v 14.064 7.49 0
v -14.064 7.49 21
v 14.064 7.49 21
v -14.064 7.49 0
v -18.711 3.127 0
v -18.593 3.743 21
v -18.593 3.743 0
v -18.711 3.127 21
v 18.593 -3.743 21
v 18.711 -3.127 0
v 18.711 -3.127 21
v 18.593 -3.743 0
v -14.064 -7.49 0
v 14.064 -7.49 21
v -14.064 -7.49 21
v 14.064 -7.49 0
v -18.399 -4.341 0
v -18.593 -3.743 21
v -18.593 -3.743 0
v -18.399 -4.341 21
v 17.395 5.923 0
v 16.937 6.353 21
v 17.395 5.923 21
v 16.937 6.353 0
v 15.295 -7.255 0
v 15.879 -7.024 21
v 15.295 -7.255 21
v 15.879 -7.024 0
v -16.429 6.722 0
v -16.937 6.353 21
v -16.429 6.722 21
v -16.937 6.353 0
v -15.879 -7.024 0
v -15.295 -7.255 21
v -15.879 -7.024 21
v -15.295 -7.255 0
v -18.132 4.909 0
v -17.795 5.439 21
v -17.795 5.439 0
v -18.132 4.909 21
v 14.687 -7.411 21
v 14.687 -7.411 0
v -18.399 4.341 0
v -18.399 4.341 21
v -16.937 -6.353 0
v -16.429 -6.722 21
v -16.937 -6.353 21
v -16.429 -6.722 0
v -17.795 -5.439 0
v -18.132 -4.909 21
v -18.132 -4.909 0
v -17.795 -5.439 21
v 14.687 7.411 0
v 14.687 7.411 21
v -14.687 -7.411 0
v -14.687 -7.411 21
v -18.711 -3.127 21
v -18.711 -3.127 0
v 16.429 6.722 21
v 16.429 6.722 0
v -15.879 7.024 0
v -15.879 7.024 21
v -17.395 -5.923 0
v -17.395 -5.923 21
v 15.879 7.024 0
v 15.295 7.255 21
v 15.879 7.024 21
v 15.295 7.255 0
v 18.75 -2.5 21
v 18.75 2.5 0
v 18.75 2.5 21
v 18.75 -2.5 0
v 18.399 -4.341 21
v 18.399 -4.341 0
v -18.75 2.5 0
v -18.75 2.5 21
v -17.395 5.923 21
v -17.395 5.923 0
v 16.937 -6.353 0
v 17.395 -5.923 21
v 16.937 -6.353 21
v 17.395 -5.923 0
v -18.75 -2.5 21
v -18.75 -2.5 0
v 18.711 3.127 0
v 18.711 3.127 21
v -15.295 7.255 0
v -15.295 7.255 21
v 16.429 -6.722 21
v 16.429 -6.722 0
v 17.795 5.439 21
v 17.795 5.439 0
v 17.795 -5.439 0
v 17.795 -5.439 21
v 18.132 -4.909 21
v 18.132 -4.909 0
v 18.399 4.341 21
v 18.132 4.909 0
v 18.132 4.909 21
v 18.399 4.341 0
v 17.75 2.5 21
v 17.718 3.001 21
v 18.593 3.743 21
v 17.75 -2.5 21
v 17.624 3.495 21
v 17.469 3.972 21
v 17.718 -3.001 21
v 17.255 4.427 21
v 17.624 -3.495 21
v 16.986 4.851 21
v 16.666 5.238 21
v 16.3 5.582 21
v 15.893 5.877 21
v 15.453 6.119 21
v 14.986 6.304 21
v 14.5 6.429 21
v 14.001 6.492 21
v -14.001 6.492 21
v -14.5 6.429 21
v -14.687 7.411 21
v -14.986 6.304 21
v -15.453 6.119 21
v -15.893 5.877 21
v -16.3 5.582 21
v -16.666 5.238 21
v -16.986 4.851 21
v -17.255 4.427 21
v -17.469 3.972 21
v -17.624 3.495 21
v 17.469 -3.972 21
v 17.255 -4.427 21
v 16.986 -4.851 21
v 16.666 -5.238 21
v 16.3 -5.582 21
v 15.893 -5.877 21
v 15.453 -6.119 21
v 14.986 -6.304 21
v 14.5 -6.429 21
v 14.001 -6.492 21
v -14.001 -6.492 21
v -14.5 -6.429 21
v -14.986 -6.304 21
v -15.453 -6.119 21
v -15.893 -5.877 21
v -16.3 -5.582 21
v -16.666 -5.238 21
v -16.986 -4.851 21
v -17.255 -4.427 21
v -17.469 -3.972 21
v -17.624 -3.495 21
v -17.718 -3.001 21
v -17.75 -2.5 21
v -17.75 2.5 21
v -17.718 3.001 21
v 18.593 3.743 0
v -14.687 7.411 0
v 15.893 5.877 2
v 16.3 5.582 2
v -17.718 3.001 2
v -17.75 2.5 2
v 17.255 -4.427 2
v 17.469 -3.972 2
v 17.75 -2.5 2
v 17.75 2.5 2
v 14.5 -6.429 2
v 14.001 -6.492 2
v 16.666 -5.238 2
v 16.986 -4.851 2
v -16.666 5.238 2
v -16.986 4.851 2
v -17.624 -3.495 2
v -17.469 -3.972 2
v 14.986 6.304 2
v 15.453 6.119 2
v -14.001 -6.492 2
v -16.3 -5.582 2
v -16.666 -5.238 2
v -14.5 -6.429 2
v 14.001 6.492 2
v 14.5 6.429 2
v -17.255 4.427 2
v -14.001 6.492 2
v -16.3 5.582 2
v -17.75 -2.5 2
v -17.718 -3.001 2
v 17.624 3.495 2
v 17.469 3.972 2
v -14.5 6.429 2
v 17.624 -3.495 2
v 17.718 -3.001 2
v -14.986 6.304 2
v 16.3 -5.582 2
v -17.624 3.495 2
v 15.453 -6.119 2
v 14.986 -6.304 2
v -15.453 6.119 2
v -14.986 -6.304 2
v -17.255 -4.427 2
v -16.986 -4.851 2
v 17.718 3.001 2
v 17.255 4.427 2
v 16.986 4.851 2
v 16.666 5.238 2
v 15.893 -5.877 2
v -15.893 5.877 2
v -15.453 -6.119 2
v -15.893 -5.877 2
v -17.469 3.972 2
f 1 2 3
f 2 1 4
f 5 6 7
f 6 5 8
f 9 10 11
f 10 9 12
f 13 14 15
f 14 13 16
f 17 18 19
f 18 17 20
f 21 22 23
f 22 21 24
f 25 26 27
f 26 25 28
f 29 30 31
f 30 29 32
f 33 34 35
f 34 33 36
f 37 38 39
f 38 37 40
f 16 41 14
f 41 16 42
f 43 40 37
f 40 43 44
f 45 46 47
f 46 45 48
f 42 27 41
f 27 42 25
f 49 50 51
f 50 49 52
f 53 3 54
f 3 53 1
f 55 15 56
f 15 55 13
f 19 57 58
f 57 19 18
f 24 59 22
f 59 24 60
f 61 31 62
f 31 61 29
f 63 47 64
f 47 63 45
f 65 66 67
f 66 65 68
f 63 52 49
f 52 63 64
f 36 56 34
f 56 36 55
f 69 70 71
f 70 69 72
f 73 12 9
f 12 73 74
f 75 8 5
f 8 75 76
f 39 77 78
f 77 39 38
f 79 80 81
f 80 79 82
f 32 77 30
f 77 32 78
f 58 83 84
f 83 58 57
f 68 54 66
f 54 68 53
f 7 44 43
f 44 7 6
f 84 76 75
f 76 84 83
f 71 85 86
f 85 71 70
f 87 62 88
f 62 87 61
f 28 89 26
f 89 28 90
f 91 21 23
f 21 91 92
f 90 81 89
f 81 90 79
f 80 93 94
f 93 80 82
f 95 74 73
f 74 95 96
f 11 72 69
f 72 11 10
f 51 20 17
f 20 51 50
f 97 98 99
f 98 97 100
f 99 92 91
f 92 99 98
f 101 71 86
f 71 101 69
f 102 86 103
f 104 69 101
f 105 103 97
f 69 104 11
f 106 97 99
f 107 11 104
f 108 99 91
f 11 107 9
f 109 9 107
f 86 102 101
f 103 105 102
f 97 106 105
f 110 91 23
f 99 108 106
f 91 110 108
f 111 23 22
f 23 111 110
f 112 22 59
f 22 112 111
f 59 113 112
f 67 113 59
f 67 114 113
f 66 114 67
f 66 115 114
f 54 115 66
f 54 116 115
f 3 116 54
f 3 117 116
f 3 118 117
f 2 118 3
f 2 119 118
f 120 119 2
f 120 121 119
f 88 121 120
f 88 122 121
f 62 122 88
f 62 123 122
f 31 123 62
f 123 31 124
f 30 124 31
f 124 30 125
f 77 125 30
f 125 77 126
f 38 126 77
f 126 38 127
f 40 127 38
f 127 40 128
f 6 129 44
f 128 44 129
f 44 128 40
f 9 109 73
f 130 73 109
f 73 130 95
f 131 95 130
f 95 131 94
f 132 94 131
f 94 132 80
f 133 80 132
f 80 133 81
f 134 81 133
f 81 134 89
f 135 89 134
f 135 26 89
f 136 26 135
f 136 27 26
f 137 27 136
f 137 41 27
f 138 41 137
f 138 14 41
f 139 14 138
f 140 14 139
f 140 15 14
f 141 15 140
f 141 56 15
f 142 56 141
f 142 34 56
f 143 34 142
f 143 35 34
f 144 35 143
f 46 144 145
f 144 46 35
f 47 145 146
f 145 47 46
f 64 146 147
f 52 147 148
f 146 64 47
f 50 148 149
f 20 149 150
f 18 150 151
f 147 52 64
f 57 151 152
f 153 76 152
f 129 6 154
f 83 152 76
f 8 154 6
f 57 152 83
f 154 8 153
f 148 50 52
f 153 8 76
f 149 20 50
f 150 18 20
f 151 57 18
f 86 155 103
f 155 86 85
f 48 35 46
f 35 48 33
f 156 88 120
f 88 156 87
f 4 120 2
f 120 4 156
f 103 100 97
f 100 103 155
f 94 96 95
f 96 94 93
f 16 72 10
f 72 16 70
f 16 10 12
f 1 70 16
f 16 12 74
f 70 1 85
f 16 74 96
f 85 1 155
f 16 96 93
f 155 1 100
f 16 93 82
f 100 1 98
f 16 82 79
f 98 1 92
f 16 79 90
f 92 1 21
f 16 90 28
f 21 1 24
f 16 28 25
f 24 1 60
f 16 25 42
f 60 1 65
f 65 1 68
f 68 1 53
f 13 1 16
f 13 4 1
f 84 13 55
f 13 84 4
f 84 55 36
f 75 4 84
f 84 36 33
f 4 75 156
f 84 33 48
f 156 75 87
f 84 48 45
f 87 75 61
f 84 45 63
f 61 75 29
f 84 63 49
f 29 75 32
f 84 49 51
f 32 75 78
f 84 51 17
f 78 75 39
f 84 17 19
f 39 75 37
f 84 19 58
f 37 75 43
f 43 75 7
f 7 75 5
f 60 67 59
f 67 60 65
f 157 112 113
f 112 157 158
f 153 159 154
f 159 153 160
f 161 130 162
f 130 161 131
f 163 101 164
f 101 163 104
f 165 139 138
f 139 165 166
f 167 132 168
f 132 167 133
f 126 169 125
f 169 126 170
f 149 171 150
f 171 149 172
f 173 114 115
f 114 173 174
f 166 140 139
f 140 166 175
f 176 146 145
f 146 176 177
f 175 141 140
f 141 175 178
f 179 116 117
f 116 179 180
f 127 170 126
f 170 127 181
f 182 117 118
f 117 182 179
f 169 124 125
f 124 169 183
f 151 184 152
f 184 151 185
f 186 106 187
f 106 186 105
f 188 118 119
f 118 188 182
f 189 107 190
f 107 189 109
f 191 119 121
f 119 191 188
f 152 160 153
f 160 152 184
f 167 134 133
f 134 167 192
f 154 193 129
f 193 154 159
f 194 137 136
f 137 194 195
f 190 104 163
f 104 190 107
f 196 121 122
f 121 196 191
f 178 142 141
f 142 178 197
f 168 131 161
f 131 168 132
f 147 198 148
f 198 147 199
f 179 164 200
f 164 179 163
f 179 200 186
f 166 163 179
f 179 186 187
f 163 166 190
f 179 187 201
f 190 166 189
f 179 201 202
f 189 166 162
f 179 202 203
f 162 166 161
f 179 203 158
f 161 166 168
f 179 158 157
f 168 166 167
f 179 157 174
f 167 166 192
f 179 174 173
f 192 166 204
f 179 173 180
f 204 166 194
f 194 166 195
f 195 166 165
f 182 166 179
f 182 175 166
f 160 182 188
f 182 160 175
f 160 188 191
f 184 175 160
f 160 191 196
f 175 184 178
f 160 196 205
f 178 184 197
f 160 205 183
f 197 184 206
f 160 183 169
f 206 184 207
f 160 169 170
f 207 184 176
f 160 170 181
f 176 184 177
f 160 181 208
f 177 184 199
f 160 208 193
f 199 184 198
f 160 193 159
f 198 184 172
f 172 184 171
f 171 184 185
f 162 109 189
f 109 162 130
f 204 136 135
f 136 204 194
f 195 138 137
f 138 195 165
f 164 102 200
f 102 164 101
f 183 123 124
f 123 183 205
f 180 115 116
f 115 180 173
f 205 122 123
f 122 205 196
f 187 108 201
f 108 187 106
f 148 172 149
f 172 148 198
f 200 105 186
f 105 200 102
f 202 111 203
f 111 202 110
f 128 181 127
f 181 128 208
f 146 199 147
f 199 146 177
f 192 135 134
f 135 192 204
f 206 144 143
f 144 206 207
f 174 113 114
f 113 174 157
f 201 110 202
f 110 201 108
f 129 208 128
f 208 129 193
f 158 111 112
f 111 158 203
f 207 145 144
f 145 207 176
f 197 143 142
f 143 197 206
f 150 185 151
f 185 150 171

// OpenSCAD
$fn = 50;


difference() {
	union() {
		hull() {
			translate(v = [-13.7500000000, 2.5000000000, 0]) {
				cylinder(h = 21, r = 5);
			}
			translate(v = [13.7500000000, 2.5000000000, 0]) {
				cylinder(h = 21, r = 5);
			}
			translate(v = [-13.7500000000, -2.5000000000, 0]) {
				cylinder(h = 21, r = 5);
			}
			translate(v = [13.7500000000, -2.5000000000, 0]) {
				cylinder(h = 21, r = 5);
			}
		}
	}
	union() {
		translate(v = [0, 0, 2]) {
			hull() {
				translate(v = [-13.7500000000, 2.5000000000, 0]) {
					cylinder(h = 19, r = 4);
				}
				translate(v = [13.7500000000, 2.5000000000, 0]) {
					cylinder(h = 19, r = 4);
				}
				translate(v = [-13.7500000000, -2.5000000000, 0]) {
					cylinder(h = 19, r = 4);
				}
				translate(v = [13.7500000000, -2.5000000000, 0]) {
					cylinder(h = 19, r = 4);
				}
			}
		}
	}
}
